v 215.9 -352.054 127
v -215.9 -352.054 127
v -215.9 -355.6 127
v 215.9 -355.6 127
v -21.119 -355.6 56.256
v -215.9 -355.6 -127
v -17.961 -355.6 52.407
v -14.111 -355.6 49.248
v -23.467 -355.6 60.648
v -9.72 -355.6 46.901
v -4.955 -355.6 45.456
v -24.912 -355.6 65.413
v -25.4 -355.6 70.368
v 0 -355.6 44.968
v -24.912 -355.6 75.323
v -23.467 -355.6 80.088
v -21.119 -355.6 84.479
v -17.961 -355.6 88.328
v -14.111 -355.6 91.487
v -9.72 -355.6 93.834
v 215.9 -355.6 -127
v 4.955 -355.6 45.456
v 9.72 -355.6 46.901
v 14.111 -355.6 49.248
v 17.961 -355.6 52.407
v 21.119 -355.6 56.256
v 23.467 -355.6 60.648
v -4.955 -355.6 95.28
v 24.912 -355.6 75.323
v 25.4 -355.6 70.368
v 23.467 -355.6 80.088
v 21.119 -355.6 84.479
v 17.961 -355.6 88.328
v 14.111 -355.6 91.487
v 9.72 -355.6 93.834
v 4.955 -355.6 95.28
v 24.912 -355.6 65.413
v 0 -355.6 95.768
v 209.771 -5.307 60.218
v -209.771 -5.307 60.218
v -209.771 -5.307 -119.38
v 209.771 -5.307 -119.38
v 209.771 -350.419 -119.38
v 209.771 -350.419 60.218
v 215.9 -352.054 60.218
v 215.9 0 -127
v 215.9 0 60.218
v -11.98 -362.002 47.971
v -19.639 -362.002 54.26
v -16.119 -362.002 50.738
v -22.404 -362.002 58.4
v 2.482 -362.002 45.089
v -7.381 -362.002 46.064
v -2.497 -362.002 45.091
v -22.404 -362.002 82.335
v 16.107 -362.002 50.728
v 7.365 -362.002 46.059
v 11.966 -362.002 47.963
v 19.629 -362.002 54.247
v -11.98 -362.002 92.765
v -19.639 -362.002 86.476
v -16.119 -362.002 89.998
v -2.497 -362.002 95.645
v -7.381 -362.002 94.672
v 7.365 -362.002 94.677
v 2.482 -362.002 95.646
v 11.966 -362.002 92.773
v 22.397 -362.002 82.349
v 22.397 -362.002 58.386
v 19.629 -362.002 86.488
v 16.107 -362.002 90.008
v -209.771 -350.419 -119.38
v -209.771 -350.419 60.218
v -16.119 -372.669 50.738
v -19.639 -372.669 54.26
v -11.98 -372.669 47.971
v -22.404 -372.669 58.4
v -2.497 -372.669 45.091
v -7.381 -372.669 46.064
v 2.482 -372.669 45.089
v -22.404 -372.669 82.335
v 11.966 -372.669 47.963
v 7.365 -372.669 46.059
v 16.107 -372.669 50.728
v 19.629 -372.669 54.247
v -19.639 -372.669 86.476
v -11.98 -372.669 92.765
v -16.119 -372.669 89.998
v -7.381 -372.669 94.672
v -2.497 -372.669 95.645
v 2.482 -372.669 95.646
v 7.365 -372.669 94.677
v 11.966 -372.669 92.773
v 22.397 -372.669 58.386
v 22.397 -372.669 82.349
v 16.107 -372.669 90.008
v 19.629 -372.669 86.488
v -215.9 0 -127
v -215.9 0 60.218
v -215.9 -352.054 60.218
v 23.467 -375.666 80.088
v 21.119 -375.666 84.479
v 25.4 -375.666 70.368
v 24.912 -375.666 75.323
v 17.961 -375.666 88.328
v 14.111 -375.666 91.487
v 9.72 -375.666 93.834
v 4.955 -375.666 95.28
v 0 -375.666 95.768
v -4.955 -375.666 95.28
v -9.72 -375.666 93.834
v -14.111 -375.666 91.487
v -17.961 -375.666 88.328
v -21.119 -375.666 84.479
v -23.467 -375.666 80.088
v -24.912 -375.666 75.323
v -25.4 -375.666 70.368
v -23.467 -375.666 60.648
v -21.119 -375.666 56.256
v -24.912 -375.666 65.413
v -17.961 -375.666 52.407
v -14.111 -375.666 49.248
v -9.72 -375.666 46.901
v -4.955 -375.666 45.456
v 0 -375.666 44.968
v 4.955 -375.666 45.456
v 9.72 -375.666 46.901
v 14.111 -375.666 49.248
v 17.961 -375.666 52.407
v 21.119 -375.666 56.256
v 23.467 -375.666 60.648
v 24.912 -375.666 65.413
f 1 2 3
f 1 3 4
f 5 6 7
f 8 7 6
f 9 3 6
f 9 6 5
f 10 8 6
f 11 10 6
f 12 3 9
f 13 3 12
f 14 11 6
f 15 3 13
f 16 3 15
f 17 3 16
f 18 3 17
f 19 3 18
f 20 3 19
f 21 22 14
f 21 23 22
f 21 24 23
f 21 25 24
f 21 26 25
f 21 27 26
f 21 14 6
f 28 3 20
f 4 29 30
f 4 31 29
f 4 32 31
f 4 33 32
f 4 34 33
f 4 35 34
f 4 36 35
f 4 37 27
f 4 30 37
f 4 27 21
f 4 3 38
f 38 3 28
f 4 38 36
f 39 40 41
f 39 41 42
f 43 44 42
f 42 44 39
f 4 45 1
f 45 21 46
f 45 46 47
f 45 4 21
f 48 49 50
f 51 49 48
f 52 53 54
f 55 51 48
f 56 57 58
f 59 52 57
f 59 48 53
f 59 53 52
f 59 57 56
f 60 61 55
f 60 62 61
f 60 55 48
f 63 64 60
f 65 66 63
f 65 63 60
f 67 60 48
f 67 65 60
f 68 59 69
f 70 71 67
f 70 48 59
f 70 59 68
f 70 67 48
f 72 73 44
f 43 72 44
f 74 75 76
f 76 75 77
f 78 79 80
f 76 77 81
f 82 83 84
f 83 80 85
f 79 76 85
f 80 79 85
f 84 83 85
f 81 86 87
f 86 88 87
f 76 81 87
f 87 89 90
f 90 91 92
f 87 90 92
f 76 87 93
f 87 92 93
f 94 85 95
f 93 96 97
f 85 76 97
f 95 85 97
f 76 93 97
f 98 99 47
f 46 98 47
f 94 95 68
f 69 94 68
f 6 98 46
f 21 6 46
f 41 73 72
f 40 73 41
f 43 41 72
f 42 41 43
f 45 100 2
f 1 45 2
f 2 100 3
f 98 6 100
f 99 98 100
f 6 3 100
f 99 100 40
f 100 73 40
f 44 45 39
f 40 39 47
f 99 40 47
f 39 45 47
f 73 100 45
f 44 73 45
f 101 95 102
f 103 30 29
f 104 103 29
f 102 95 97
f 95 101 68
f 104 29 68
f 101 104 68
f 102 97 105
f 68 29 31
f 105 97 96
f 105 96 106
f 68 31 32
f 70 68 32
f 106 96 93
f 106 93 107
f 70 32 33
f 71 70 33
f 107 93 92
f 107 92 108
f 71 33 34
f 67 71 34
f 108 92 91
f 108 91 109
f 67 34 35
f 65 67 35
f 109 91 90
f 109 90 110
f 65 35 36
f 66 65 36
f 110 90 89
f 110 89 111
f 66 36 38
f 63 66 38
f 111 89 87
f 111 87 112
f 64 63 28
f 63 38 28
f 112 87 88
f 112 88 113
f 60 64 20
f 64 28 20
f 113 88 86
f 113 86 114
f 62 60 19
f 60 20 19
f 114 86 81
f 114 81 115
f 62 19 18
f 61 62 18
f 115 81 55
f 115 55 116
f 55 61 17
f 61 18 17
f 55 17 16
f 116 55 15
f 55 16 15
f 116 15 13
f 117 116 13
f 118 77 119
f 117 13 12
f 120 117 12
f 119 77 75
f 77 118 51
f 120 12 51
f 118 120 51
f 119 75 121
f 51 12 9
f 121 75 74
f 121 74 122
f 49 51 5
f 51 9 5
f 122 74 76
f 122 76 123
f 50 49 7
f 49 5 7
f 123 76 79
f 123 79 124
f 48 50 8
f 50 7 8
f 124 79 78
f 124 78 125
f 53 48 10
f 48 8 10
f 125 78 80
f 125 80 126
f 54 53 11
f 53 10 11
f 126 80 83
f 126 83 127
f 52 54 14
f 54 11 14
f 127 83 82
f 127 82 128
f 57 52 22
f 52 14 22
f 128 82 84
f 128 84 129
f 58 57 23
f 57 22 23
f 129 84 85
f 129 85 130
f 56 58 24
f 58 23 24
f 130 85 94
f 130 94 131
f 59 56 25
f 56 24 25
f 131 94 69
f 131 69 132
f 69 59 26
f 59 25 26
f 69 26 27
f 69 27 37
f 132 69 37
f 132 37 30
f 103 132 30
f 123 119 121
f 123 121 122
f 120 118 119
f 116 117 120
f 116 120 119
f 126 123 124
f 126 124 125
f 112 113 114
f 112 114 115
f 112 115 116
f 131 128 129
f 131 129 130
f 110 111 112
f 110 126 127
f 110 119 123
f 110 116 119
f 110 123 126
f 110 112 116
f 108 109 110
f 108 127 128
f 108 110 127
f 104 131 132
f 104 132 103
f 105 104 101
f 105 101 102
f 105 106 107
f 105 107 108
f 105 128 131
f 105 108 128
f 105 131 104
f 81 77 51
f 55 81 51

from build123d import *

# Parameters (mm, degrees)
F0_W      = 431.8
F0_H      = 254
F1_DEPTH  = 355.6
F2_W      = 419.5426851511
F2_H      = 345.1122520491
F3_DEPTH  = 246.38
F5_R      = 25.4
F6_DEPTH  = 20.066
F7_W      = 352.0536348224
F7_H      = 66.7818960792
F8_DEPTH  = 431.801
F9_W      = 44.8005609214
F9_H      = 10.6667876244
F10_DEPTH = 254.001


# Not quite as in the source:
# - a feature names something its author has since deleted; it is built from what else it names


with BuildPart() as f1:
    # F0 (on Front) → F1 (new body)
    with BuildSketch(Plane.XZ):
        Rectangle(F0_W, F0_H)
    extrude(amount=F1_DEPTH)

    # F2 (on face) → F3 (cut)
    with BuildSketch(Plane.XY.offset(127)):
        with Locations((1.86265e-05, -177.8631941415)):
            Rectangle(F2_W, F2_H)
    extrude(amount=-F3_DEPTH, mode=Mode.SUBTRACT)

    # F5 (on face) → F6 (join)
    with BuildSketch(Plane.XZ.offset(355.6)):
        with Locations((0, 70.3678135578)):
            Circle(F5_R)
    extrude(amount=F6_DEPTH)

    # F7 (on face) → F8 (cut, through all)
    with BuildSketch(Plane.YZ.offset(215.9)):
        with Locations((-176.0268174112, 93.6090519604)):
            Rectangle(F7_W, F7_H)
    extrude(amount=-F8_DEPTH, mode=Mode.SUBTRACT)

    # F9 (on face) → F10 (cut, through all)
    with BuildSketch(Plane.XY.offset(127)):
        with Locations((-0.0037699938, -367.3357367516)):
            Rectangle(F9_W, F9_H)
    extrude(amount=-F10_DEPTH, mode=Mode.SUBTRACT)


solid = f1.part
